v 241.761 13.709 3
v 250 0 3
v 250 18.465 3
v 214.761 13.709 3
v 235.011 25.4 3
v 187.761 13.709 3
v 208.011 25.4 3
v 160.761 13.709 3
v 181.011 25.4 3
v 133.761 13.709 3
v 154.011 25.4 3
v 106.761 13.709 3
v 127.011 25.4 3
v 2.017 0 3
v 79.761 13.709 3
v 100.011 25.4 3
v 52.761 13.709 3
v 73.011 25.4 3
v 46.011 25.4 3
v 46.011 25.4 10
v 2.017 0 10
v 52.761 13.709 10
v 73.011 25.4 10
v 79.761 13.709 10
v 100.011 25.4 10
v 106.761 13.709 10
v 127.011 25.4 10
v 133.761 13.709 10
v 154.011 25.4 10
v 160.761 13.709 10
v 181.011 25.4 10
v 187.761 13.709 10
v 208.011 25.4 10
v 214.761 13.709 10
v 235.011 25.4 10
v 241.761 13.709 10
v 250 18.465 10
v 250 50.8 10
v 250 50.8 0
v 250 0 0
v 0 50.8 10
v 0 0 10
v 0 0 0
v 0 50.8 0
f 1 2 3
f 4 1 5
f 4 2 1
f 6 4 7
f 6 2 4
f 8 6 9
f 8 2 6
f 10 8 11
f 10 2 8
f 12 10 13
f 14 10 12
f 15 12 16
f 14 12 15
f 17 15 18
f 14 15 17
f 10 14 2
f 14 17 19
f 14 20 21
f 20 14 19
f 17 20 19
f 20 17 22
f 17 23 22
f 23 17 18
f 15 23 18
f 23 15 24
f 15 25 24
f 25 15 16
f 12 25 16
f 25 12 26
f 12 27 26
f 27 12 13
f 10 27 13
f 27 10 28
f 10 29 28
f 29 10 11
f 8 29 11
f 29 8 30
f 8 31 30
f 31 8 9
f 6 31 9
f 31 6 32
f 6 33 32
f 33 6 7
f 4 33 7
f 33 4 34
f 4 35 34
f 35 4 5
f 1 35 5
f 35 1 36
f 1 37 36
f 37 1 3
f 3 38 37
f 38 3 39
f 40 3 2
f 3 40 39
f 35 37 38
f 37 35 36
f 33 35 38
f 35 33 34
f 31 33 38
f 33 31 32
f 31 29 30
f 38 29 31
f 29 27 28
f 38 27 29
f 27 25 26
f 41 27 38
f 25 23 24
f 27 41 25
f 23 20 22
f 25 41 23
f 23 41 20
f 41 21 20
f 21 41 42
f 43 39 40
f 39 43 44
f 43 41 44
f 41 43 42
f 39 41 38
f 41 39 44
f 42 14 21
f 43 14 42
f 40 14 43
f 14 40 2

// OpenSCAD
// 1830: The Game of Railroads and Robber Barons
//
// by W. Craig Trader is dual-licensed under
// Creative Commons Attribution-ShareAlike 3.0 Unported License and
// GNU Lesser GPL 3.0 or later.

include <MCAD/units.scad>;

// Command Line Arguments
PART = "other";         // Which part to output
VERBOSE = 1;        	// Set to non-zero to see more data

// Game box dimensions
BOX_WIDTH       = 11.500 * inch;    // (X)
BOX_HEIGHT      =  9.625 * inch;    // (Y)
BOX_DEPTH       =  2.250 * inch;    // (Z)

ALT_WIDTH       = 8.000 * inch;
ALT_HEIGHT      = 7.000 * inch;

// Tokens
TOKEN_DIAMETER  = 14.0 * mm;
TOKEN_HEIGHT    =  5.0 * mm;

// Cards
CARD_WIDTH      = 2.500 * inch;
CARD_HEIGHT     = 1.625 * inch;
SHARE_THICKNESS = 5.000 * mm;
TRAIN_THICKNESS = 5.000 * mm;

// Tile dimensions
TILE_DIAMETER   = 46.00 * mm;
TILE_THICKNESS  =  0.65 * mm;
POKE_HOLE       = 35.00 * mm;    // Diameter of poke holes in bottom

include <18XX.scad>;

// ----- Data ------------------------------------------------------------------

tx3 = 3 * TOKEN_DIAMETER; 
tx5 = 5 * TOKEN_DIAMETER;
tx8 = tx5 + tx3 + THIN_WALL;
ty  = TOKEN_DIAMETER;

TOKEN_CELLS = [
    [ [ tx5, ty ], [ tx3, ty ], [ tx3, ty ] ],
    [ [ tx5, ty ], [ tx3, ty ], [ tx3, ty ] ],
    [ [ tx5, ty ], [ tx3, ty ], [ tx3, ty ] ],
    [ [ tx5, ty ], [ tx3, ty ], [ tx3, ty ] ],
    [ [ tx5, ty ], [ tx3, ty ], [ tx3, ty ] ],
    [ [ tx5, ty ], [ tx3, ty ], [ tx3, ty ] ],
    [ [ tx5, ty ], [ tx3, ty ], [ tx3, ty ] ],
    [ [ tx5, ty ], [ tx3, ty ], [ tx3, ty ] ],
    [ [ tx8, ty ], [ tx3, ty ] ],
];

cx = CARD_WIDTH  + 1 * mm;
cy = CARD_HEIGHT + 1 * mm;

CARD_CELLS = [
    [ [ cx, cy ], [ cx, cy ], [ cx, cy ] ],
    [ [ cx, cy ], [ cx, cy ], [ cx, cy ] ],
    [ [ cx, cy ], [ cx, cy ], [ cx, cy ] ],
];

// ----- Functions -------------------------------------------------------------

// ----- Modules ---------------------------------------------------------------

module tile_box( count=5 ) {
    hex_tray( TILE_CENTERS_3X5, BOX_HEIGHT, BOX_WIDTH/2, count*TILE_THICKNESS+STUB, WIDE_WALL, "1867", "V1" );
}

module tile_lid( holes=true ) {
    hex_lid( TILE_CENTERS_3X5, BOX_HEIGHT, BOX_WIDTH/2, 4*mm, WIDE_WALL, THIN_WALL, false, true, holes );
}

module alt_tile_box( count=5 ) {
    hex_tray( TILE_CENTERS_4X4, ALT_WIDTH, ALT_HEIGHT, count*TILE_THICKNESS+STUB, WIDE_WALL, "1867", "V2" );
}

module alt_tile_lid( holes=true ) {
    hex_lid( TILE_CENTERS_4X4, ALT_WIDTH, ALT_HEIGHT, 4*mm, WIDE_WALL, THIN_WALL, false, true, holes );
}

module token_box() {
    cell_box( TOKEN_CELLS, TOKEN_HEIGHT, BOTTOM, TOP, THIN_WALL, THIN_WALL );
}

module token_lid() {
    cell_lid( TOKEN_CELLS, TOKEN_HEIGHT, BOTTOM, TOP, THIN_WALL, THIN_WALL );
}

module card_box() {
    cell_box( CARD_CELLS, SHARE_THICKNESS, BOTTOM, TOP, THIN_WALL, THIN_WALL, true );
}

module card_lid() {
    cell_lid( CARD_CELLS, SHARE_THICKNESS, BOTTOM, TOP, THIN_WALL, THIN_WALL );
}

module card_rack( count, thickness, width ) {
    
    height = 10 * mm;
    length = C60 * count * thickness + (count+1) * 2 * mm + 5 *mm;
    dx = 2*mm + C60 * thickness;
    
    difference() {
        cube( [ length, width, height ] );
        
        for (x=[0:1:count-1]) {
#            translate( [x*dx+2,-OVERLAP,3] ) rotate( [0,0,-60] ) cube( [ thickness, width+2*OVERLAP, CARD_HEIGHT ] );
        }
    }
}

// ----- Rendering -------------------------------------------------------------

if (PART == "tile-lid") {
    tile_lid();
} else if (PART == "tile-tray-05") {
    tile_box(5);
} else if (PART == "tile-tray-10") {
    tile_box(10);
} else if (PART == "alt-tile-lid") {
    alt_tile_lid();
} else if (PART == "alt-tile-tray-05") {
    alt_tile_box(5);
} else if (PART == "alt-tile-tray-10") {
    alt_tile_box(10);
} else if (PART == "card-box") {
    card_box();
} else if (PART == "card-lid") {
    card_lid();
} else if (PART == "token-box") {
    token_box();
} else if (PART == "token-lid") {
    token_lid();
} else {
    
    card_rack( 9, 10*SHARE_THICKNESS, 2 * inch );
    
/*    
    translate( [-3,  -3, 0] ) rotate( [0,0,180] ) alt_tile_box();
    translate( [-3,   3, 0] ) rotate( [0,0,180] ) alt_tile_lid();
*/
    
/*
    translate( [ 3,   3, 0] ) token_box();
    translate( [ 3,-138, 0] ) token_lid();
    
    translate( [ 170,    3, 0] ) card_box();
    translate( [ 170, -132, 0] ) card_lid();
*/
}
